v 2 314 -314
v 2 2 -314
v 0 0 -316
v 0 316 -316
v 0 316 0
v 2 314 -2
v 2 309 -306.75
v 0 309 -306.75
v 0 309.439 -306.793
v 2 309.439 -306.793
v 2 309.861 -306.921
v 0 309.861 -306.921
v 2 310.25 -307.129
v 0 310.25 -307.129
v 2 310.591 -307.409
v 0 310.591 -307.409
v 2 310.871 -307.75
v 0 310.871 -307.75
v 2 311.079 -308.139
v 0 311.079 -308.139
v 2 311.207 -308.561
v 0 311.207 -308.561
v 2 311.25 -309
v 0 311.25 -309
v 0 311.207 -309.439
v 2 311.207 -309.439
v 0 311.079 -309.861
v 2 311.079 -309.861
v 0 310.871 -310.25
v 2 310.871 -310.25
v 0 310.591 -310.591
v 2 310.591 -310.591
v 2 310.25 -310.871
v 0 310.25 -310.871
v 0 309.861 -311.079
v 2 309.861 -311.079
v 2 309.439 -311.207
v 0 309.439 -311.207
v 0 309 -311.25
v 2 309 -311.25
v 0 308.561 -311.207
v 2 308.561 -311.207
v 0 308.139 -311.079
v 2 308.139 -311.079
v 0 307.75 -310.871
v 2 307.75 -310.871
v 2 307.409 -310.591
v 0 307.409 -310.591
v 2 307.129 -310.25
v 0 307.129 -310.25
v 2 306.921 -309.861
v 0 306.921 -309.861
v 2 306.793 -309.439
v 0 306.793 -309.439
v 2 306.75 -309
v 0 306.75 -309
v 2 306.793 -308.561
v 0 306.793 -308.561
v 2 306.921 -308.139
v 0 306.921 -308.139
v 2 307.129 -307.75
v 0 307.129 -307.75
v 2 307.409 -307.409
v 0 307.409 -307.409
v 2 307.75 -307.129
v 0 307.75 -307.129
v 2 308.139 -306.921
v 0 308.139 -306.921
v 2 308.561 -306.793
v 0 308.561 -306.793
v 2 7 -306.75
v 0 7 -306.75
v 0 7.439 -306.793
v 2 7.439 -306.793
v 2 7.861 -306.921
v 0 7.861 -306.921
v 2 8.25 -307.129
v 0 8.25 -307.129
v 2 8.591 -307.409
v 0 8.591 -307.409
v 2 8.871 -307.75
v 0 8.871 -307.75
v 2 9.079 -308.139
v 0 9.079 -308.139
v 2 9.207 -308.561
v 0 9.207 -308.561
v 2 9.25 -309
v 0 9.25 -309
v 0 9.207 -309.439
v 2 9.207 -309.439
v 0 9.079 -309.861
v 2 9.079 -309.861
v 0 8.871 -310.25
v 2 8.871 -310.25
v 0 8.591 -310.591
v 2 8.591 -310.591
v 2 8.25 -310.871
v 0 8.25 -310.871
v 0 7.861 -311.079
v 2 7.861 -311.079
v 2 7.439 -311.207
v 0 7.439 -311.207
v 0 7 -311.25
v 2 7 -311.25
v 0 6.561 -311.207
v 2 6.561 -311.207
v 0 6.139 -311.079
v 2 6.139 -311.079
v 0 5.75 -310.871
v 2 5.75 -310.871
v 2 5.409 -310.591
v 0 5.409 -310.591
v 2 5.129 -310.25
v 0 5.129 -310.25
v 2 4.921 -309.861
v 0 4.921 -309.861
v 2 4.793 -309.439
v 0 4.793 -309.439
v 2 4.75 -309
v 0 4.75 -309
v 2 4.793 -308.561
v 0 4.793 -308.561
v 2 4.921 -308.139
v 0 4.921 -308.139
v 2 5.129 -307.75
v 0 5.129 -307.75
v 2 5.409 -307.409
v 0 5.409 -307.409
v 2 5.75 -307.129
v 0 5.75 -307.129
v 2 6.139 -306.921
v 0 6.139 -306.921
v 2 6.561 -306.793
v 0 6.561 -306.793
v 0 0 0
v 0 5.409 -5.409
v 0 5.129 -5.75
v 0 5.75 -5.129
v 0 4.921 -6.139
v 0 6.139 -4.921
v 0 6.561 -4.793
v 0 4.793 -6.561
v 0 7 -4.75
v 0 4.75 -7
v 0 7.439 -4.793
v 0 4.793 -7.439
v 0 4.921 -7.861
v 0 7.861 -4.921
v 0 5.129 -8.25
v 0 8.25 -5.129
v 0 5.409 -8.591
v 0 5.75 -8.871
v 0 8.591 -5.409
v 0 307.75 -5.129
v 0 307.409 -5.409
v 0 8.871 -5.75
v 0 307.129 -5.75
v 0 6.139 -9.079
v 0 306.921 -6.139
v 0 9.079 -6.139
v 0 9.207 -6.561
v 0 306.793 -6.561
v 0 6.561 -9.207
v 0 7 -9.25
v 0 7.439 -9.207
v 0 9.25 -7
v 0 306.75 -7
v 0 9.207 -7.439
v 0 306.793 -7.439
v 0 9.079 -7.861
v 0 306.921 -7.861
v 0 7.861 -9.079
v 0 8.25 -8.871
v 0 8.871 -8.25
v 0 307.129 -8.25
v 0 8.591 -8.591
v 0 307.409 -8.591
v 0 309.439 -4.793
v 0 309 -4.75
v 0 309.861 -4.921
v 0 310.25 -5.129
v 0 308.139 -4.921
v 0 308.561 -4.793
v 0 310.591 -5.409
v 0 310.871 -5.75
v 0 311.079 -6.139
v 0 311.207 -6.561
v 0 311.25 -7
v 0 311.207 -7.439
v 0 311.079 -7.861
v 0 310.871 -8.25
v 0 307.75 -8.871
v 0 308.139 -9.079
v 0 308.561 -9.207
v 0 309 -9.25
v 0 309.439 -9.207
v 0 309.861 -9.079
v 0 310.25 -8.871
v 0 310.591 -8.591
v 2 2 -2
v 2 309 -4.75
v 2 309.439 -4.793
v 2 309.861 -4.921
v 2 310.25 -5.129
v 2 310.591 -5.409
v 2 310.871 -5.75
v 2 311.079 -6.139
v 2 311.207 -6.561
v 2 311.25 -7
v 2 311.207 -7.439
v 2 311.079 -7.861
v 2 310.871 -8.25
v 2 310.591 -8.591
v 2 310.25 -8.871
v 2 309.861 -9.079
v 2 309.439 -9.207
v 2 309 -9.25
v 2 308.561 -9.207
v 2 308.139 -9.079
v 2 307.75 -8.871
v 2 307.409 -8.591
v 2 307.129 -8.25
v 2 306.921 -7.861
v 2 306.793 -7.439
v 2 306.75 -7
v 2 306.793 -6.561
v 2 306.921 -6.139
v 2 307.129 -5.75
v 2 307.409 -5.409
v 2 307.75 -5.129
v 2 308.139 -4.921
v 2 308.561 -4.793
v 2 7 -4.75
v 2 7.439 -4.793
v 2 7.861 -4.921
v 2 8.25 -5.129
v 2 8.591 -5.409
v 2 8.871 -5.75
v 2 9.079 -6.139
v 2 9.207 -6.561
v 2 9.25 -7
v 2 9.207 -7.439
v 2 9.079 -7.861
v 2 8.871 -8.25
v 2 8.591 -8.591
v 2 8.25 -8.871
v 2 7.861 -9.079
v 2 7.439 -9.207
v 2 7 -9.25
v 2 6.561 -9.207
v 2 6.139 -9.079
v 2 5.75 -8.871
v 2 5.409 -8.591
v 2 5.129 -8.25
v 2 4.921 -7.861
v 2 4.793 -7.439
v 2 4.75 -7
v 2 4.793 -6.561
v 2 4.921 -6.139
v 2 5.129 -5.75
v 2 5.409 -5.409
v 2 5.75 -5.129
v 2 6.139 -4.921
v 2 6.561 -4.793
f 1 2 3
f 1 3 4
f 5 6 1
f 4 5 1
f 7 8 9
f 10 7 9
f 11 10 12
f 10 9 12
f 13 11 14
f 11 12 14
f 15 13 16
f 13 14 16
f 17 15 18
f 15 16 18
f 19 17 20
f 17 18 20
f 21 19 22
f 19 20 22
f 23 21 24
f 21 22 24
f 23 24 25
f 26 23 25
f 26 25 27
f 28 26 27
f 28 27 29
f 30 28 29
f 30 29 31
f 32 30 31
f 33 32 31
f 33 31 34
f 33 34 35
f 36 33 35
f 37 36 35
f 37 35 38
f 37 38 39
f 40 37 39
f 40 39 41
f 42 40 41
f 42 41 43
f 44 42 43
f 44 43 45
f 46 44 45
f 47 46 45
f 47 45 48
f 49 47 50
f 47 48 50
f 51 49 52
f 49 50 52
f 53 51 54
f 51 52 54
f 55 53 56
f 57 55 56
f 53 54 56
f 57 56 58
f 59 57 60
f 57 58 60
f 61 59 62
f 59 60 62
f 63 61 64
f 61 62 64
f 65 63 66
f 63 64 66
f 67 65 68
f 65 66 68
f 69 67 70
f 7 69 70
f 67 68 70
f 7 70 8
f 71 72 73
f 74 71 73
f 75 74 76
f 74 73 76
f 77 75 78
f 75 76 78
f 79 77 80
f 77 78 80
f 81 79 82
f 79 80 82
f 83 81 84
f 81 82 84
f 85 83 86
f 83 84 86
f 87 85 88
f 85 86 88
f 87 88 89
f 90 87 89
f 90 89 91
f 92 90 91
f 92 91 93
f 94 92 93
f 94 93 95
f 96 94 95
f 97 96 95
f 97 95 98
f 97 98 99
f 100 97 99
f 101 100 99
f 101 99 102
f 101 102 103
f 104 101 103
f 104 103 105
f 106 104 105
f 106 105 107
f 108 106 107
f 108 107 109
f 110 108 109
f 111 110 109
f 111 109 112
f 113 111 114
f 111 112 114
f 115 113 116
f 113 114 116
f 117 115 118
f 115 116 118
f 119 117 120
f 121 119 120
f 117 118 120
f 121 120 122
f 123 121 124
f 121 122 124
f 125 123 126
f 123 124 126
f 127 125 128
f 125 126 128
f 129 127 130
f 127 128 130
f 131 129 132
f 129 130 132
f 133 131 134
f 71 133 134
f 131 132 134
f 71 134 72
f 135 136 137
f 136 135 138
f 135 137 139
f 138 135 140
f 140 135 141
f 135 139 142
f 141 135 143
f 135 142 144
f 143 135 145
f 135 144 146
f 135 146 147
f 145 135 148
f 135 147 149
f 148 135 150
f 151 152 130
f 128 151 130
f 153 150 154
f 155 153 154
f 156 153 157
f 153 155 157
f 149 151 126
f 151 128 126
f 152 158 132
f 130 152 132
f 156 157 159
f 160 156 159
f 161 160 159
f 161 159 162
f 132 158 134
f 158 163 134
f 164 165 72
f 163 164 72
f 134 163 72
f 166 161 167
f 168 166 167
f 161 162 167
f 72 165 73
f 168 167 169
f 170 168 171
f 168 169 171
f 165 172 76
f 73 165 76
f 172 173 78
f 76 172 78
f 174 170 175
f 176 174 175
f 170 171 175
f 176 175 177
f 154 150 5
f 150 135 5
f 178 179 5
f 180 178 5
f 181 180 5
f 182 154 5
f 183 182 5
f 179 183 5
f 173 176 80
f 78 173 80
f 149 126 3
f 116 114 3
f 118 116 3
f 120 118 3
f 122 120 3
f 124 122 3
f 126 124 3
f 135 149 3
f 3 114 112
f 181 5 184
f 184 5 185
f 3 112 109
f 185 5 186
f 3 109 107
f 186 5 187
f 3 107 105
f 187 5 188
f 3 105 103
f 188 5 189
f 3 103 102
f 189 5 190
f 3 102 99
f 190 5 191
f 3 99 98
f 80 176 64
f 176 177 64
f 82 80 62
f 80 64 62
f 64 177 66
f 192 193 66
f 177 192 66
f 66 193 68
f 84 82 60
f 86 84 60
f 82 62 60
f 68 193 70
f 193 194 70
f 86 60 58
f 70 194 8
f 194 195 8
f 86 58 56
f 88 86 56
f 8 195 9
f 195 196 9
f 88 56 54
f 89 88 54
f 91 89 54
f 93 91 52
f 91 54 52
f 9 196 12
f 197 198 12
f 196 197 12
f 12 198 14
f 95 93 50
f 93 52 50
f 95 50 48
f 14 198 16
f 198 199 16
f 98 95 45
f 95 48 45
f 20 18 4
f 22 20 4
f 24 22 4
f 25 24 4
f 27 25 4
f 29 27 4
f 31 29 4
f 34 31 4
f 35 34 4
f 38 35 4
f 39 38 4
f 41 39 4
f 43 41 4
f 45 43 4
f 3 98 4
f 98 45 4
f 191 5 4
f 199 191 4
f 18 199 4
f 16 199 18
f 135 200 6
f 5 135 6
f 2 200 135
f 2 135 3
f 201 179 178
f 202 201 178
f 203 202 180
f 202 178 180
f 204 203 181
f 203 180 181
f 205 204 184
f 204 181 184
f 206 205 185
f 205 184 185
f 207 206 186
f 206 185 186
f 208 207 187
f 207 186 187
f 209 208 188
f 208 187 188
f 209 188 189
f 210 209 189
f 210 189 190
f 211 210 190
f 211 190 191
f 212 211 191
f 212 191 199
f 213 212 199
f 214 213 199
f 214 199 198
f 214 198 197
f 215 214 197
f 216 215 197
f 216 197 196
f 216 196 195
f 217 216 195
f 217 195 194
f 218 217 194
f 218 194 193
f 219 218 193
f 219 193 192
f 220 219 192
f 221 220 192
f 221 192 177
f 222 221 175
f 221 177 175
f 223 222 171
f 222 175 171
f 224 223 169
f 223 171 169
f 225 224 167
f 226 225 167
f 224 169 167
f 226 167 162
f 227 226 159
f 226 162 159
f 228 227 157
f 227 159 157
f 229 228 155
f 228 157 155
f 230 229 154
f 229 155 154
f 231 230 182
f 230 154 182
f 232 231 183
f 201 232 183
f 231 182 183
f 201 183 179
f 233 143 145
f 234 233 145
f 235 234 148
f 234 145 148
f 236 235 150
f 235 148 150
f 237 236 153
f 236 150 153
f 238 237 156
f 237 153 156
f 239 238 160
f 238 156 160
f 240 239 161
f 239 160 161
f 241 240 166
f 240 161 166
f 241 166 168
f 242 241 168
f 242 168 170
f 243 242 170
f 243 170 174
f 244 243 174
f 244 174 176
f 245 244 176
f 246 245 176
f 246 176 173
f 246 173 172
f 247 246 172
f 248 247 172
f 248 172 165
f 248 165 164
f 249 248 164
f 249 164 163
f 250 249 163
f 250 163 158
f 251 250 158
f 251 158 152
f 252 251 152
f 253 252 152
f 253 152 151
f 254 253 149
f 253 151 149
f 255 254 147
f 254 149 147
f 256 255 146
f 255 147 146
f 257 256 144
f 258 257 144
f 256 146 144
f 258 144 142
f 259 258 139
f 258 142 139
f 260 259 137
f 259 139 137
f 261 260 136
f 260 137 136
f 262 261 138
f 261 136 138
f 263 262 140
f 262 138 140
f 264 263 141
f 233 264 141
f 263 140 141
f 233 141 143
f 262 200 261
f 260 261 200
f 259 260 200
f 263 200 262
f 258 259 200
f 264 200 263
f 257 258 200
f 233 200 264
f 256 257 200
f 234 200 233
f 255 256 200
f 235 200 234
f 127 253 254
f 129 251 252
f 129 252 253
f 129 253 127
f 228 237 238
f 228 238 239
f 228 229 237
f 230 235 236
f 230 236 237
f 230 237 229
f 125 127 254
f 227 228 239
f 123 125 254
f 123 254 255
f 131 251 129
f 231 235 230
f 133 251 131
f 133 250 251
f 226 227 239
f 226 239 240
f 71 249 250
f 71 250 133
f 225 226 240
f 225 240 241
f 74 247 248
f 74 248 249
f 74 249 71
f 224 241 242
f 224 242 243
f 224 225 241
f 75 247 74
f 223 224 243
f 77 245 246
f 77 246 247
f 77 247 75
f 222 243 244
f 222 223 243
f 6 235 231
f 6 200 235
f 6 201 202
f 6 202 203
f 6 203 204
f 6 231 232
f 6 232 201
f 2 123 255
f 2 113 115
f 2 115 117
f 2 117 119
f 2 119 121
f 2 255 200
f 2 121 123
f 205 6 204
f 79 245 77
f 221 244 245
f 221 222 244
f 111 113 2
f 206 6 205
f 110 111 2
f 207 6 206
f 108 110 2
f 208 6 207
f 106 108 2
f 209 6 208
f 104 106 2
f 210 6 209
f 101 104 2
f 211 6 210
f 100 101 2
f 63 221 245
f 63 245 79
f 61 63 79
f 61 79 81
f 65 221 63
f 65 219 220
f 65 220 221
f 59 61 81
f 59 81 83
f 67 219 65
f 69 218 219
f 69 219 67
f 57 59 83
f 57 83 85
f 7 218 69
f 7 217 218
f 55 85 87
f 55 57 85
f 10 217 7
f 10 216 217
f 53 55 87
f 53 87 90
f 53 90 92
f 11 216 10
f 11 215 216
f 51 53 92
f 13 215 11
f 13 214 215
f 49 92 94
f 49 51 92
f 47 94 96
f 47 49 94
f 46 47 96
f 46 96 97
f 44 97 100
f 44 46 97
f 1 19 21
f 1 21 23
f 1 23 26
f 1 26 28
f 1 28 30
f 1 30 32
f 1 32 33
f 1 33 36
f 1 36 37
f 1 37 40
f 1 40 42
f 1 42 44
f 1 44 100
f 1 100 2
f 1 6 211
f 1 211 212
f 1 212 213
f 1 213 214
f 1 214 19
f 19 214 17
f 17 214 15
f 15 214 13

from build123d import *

# Parameters (mm, degrees)
SKETCH1_W                = 316
SKETCH1_H                = 316
BOSS_EXTRUDE1_DEPTH      = 2
CHAMFER1_SIZE            = 2
M4_CLEARANCE_HOLE1_D     = 4.5
M4_CLEARANCE_HOLE1_DEPTH = 30
M4_CLEARANCE_HOLE1_TIP   = 1.351936393


with BuildPart() as part:
    # Sketch1 → Boss-Extrude1 (new body)
    with BuildSketch(Plane(origin=(0, 0, 0), x_dir=(0, 0, -1), z_dir=(1, 0, 0))):
        with Locations((158, 158)):
            Rectangle(SKETCH1_W, SKETCH1_H)
    extrude(amount=BOSS_EXTRUDE1_DEPTH)

    # Chamfer1
    chamfer1_edges = [part.edges().sort_by_distance(p)[0] for p in [
        (2, 158, 0),
        (2, 316, -158),
        (2, 158, -316),
        (2, 0, -158),
    ]]
    chamfer(chamfer1_edges, length=CHAMFER1_SIZE - 0.0001)  # a hair under: the kernel refuses the full size

    # M4 Clearance Hole1
    with Locations(Plane(origin=(2, 0, 0), x_dir=(0, 0, -1), z_dir=(1, 0, 0))):
        with Locations((7, 309), (309, 309), (309, 7), (7, 7)):
            Hole(M4_CLEARANCE_HOLE1_D / 2, depth=M4_CLEARANCE_HOLE1_DEPTH)
            with Locations((0, 0, -(M4_CLEARANCE_HOLE1_DEPTH + M4_CLEARANCE_HOLE1_TIP / 2))):  # 118° drill point
                Cone(0, M4_CLEARANCE_HOLE1_D / 2, M4_CLEARANCE_HOLE1_TIP, mode=Mode.SUBTRACT)


solid = part.part
